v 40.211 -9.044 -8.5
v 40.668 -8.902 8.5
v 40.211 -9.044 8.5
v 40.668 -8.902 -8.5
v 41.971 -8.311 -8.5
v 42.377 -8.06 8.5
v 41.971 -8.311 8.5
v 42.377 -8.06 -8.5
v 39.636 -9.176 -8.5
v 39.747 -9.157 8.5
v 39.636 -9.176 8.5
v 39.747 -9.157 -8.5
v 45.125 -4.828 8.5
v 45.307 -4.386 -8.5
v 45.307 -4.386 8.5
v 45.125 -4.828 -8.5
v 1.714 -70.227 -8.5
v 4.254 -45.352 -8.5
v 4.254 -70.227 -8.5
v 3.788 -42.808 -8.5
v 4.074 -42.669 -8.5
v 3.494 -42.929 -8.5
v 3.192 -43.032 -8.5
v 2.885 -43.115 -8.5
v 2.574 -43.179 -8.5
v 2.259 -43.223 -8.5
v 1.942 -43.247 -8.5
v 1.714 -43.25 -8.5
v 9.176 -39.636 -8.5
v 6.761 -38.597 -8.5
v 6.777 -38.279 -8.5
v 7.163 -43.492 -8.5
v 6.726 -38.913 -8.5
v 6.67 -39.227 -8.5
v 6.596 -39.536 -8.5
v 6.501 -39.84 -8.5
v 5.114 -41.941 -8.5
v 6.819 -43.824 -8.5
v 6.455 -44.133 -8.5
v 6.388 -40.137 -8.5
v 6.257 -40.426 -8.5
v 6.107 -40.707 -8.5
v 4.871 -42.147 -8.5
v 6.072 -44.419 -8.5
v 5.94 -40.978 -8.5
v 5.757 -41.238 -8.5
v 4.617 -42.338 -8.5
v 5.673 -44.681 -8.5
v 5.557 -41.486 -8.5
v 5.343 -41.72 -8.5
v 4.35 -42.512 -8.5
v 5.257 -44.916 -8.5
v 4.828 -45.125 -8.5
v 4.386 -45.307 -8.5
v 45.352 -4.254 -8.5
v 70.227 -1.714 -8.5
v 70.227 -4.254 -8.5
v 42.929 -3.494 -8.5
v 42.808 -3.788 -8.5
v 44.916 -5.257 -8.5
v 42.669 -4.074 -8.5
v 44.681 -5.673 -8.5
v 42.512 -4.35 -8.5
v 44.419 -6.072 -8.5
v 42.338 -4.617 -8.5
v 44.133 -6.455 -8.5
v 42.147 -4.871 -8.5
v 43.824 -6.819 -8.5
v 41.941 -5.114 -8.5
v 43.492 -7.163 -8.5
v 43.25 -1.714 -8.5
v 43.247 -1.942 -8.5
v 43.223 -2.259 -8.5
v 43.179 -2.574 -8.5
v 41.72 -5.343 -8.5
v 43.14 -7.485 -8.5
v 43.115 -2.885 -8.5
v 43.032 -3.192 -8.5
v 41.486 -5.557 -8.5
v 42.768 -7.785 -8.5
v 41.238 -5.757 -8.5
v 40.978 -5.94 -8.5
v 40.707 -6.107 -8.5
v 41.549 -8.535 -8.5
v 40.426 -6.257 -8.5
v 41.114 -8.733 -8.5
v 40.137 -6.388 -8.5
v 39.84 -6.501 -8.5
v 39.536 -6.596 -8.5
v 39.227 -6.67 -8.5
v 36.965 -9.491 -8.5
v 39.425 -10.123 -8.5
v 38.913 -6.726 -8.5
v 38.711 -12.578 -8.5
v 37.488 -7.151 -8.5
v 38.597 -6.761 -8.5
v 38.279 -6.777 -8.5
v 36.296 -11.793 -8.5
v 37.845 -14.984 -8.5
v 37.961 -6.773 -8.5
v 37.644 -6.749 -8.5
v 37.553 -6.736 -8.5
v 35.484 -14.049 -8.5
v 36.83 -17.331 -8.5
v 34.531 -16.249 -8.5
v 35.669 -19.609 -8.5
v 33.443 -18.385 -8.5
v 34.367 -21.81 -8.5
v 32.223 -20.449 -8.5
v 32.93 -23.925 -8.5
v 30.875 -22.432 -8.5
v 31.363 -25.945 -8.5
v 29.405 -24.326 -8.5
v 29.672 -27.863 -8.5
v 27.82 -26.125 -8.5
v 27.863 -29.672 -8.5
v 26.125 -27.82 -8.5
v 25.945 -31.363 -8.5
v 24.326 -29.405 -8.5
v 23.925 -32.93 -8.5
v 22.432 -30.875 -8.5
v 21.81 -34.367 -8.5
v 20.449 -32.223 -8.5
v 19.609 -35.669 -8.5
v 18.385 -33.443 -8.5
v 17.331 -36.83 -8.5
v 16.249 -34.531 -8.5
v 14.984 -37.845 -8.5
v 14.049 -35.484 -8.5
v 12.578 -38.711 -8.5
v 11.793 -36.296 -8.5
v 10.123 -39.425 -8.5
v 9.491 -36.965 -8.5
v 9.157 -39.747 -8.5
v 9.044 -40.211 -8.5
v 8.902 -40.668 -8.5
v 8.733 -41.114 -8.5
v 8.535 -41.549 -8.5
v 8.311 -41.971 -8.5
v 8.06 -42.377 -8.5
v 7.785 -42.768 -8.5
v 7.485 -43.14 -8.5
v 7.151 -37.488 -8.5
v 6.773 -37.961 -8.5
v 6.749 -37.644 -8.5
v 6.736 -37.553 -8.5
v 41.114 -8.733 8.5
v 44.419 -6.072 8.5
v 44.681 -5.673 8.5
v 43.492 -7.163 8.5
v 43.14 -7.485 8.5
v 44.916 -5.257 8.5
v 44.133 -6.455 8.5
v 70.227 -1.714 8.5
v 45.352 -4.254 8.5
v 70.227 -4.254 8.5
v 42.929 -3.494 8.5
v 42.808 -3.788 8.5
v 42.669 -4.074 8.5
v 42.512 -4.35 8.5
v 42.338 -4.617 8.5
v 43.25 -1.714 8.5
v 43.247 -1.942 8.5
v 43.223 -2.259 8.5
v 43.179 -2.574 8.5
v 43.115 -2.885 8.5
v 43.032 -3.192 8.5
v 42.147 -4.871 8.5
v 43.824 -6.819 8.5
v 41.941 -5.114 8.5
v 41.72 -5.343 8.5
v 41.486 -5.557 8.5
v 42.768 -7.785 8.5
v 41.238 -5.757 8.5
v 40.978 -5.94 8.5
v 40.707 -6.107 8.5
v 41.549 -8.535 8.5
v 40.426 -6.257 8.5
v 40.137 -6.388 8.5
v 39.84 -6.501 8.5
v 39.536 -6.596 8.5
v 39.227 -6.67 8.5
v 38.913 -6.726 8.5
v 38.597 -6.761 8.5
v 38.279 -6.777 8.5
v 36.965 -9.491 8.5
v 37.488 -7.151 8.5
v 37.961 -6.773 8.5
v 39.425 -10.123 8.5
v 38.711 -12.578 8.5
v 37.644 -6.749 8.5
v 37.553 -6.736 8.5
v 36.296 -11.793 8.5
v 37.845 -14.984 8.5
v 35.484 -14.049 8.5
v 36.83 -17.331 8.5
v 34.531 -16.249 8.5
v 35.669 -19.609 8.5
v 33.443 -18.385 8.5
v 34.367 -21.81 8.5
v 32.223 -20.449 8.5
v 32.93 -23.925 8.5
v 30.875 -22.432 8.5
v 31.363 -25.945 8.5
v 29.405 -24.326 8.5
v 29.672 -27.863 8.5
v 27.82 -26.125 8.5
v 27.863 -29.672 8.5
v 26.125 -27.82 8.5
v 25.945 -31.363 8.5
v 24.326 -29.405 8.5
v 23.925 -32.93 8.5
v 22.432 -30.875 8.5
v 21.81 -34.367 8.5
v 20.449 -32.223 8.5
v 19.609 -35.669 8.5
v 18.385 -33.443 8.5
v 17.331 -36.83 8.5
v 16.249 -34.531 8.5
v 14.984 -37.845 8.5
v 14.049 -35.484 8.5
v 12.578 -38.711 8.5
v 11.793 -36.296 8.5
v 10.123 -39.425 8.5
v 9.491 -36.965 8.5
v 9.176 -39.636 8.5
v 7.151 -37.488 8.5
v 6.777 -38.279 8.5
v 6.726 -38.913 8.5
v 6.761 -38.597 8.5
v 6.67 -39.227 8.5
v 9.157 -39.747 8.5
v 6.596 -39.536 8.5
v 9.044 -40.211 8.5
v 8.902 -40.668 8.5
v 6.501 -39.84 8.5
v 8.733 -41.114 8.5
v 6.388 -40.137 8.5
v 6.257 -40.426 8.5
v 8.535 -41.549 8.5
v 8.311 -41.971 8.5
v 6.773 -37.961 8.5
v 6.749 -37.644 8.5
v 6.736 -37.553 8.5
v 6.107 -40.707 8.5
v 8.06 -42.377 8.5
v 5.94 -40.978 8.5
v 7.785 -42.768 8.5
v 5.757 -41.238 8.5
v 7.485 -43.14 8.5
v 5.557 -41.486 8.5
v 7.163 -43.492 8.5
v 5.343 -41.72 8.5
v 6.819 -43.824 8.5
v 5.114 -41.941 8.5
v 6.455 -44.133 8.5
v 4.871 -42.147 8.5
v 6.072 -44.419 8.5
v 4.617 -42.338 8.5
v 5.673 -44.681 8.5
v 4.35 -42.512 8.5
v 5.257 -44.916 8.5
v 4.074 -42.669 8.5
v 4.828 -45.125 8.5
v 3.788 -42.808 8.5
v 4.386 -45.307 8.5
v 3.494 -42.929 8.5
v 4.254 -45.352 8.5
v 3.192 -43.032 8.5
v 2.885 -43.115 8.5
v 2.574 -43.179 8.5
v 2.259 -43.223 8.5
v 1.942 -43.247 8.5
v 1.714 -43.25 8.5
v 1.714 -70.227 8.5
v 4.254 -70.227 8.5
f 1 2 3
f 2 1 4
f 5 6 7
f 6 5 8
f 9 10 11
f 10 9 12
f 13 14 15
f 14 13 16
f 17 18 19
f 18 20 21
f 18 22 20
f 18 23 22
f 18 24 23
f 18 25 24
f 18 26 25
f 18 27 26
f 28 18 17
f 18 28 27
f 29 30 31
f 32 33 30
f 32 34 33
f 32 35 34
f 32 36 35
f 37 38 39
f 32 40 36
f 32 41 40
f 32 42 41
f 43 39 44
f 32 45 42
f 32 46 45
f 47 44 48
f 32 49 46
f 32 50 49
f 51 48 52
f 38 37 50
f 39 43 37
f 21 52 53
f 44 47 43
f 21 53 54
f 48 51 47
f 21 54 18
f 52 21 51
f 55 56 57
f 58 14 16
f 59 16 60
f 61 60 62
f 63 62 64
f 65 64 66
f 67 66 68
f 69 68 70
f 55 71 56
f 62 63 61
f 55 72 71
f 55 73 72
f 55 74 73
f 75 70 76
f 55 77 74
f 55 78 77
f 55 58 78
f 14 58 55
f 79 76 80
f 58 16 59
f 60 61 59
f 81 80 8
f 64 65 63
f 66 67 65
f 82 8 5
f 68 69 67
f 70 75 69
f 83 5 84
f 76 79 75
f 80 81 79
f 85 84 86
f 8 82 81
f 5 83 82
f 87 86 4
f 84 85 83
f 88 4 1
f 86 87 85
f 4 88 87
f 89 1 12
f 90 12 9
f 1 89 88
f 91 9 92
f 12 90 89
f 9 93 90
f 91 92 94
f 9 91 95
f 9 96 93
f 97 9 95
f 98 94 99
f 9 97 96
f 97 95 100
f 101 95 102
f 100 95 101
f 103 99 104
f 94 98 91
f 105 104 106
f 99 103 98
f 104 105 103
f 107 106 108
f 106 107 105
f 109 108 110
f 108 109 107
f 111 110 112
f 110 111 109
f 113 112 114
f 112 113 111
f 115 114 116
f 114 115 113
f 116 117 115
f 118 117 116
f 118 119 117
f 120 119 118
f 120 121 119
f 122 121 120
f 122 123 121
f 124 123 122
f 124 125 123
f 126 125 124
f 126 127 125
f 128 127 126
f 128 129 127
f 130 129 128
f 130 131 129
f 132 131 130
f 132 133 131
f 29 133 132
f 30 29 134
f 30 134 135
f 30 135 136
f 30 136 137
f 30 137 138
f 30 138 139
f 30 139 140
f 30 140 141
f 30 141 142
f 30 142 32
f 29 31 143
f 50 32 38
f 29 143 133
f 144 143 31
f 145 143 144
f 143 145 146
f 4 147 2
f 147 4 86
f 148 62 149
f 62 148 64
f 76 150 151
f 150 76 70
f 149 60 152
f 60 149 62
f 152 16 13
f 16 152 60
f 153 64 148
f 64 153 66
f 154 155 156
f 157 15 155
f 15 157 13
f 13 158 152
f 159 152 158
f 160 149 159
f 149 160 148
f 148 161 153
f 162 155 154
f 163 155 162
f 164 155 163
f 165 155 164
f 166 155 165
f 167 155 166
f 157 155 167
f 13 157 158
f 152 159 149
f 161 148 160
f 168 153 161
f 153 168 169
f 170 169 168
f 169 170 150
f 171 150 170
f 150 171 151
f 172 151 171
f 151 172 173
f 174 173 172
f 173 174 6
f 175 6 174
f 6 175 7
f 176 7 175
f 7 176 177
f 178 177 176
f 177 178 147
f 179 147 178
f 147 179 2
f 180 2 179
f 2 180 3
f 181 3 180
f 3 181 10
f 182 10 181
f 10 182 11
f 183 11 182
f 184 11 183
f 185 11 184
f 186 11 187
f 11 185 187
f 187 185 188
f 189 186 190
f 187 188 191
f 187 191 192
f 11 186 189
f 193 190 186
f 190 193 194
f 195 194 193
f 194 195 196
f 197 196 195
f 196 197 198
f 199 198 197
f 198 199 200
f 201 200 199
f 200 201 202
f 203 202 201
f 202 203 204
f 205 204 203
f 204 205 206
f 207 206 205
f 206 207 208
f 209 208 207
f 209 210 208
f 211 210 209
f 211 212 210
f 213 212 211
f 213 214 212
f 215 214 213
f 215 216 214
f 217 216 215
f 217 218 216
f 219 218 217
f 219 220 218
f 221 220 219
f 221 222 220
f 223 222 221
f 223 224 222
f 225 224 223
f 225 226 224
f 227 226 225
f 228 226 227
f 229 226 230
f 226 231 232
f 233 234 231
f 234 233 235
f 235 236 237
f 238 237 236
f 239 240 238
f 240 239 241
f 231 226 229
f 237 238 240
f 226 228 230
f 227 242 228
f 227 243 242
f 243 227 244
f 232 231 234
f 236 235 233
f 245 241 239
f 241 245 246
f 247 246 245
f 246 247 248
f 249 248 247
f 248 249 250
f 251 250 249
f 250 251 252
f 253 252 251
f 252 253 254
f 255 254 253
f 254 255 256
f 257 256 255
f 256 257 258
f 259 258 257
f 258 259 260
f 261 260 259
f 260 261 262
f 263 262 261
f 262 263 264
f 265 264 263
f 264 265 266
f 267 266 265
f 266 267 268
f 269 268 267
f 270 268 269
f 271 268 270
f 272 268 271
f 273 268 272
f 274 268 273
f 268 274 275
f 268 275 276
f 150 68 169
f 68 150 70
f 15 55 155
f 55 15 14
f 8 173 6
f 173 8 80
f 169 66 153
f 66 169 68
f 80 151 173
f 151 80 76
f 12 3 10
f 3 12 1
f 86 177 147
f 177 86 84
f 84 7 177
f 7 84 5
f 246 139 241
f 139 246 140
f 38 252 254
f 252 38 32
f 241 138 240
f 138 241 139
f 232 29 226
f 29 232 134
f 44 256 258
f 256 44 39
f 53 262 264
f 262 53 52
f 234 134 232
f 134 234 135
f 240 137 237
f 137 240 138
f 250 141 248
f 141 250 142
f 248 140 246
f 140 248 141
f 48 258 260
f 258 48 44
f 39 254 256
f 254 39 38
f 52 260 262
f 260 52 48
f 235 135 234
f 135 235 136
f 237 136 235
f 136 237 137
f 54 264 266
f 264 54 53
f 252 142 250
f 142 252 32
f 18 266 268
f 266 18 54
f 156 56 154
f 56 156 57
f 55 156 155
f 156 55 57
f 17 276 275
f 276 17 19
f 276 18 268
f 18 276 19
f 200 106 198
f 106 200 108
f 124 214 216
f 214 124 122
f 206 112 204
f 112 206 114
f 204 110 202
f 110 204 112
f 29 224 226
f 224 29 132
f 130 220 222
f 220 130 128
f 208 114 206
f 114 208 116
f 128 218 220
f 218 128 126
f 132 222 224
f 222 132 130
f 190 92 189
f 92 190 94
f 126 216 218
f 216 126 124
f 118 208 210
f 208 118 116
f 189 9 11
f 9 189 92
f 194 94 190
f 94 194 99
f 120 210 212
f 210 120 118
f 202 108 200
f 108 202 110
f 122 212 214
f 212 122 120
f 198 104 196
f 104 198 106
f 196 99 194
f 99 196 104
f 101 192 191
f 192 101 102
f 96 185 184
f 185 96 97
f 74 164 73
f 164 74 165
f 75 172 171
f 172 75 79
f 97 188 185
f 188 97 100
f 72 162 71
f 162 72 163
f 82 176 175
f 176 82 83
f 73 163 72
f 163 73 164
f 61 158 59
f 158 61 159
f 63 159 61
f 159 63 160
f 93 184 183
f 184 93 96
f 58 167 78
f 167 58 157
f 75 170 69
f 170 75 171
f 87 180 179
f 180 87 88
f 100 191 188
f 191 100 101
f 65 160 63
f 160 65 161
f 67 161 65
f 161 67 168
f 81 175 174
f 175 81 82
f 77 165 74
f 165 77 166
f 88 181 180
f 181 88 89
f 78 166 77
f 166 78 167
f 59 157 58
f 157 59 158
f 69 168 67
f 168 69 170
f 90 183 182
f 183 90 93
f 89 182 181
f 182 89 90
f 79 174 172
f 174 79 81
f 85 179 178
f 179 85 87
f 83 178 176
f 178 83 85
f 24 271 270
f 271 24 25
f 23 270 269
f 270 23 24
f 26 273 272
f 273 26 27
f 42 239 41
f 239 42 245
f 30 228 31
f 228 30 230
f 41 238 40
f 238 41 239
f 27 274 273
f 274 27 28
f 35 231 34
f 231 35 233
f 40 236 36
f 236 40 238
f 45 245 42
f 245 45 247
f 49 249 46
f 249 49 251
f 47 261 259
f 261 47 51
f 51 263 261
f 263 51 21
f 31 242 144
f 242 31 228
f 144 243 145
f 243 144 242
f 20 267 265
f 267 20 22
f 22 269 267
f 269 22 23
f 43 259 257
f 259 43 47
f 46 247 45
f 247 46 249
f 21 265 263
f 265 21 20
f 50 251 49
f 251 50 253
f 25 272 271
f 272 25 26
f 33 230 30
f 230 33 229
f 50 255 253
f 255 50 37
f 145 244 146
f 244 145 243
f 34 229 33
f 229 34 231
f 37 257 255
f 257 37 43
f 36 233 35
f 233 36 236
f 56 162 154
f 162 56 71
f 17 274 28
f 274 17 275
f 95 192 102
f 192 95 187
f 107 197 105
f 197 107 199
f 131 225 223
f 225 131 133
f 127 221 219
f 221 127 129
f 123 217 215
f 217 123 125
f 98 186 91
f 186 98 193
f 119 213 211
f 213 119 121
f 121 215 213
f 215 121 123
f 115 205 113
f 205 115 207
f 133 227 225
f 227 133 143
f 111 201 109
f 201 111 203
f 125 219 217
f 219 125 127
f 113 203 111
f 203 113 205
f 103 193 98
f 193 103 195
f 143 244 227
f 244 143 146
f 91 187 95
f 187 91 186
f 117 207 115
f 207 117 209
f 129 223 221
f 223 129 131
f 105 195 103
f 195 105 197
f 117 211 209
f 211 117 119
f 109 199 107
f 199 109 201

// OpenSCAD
//--------------------------------------------------
// Model rocket fin alignment tool generator
//
// For openSCAD 15.03-2, and Thingiverse Customizer
//
// Written by Erik Ness 2016/12/30
//
// erik@nessnation.com
//--------------------------------------------------


//--------------------------------------------------
//        User-entered parameters
//
//  Formatted for thingiverse customizer.
//
// NOTE:  I converted the inch parameters to mm
// and then turned off inches mode because the
// thingiverse customizer freaked out when I used
// inches, even though openscad works fine.
//
// NOTE2:  Thingiverse customizer also freaks out
// if you type trailing zeros, like 1.0 or 1.10,
// so don't do that!
//--------------------------------------------------

// Dimensions are inches?  (If yes, output is scaled by 25.4 in xyz)
use_inches            = 0;      // [0:No,1:Yes]

// Rocket body outside diameter:
rocket_od             = 76.2;

// Number of fins:
rocket_num_fins       = 4;  // [3:6]

// Rocket fin thickness:
rocket_fin_thick      = 3.175;

// Tool thickness:
tool_thick            = 2.54;

// Tool height:
tool_height           = 17;

// Tool fin length (extension from rocket body):
tool_fin_len          = 32;

// Glue keepout diameter:
tool_glue_keepout_dia = 10;

// Slop for rocket body dia and fin thickness:
tool_slop             = 0.127;




/* [Hidden] */
$fn = 100;

draw_fin_len          = rocket_od / 2 + tool_fin_len * 2;
fin_angle             = 360/rocket_num_fins;
delta_angle_glue      = asin(  (rocket_fin_thick/2 + tool_slop)
                             / (rocket_od/2 + tool_slop)
                            );
final_scale           = use_inches ? 25.400 : 1.000;


scale([final_scale,final_scale,final_scale])
    difference()
    {
        union()
        {
            // Tool main arc (around rocket body):
            cylinder(  tool_height
                     , d=rocket_od+tool_slop+2*tool_thick
                     , center=true
                    );

            for (a=[0 : fin_angle : 359])
            {
                rotate([0,0,a])
                    translate([rocket_od/2+tool_slop+tool_fin_len/2,0,0])
                        cube(  [  tool_fin_len
                                , rocket_fin_thick+2*tool_slop+2*tool_thick
                                , tool_height
                               ]
                             , center=true
                            );

                for (a2=[-delta_angle_glue, delta_angle_glue])
                    rotate([0,0,a+a2])
                        translate([rocket_od/2 + tool_slop, 0, 0])
                            cylinder( h=tool_height
                                     ,d=tool_glue_keepout_dia+tool_slop+2*tool_thick
                                     ,center=true
                                    );
            }
        }

        // Erase rocket body and fins:
        rocket_with_slop();
        
        // Erase extra copies of tool:
        pie_wedge(  tool_height * 1.1
                  , rocket_od+draw_fin_len
                  , 360-fin_angle
                 );
    }






// Rocket body and fins: (plus slop)
// These are subtracted from the tool:
module rocket_with_slop()
{
    // Rocket body:
    cylinder(  tool_height*1.1
             , d=rocket_od+tool_slop
             , center=true
            );

    for (a=[0 : fin_angle : 359])
    {
        // Fin:
        rotate([0,0,a])
            translate([draw_fin_len/2,0,0])
                cube(  [  draw_fin_len*1.1
                        , rocket_fin_thick+2*tool_slop
                        , tool_height*1.1
                       ]
                     , center=true
                    );
        
        // Glue keepout cylinder:
        for (a2=[-delta_angle_glue, delta_angle_glue])
            rotate([0,0,a+a2])
                translate([rocket_od/2 + tool_slop, 0, 0])
                    cylinder( h=tool_height*1.1
                             ,d=tool_glue_keepout_dia+tool_slop
                             ,center=true
                            );
    }
}





// Draws a pie wedge h units tall, r units in radius,
// starting at angle=0, going to angle=a
module pie_wedge(h,r,a)
{
    // This would work if the angle parameter was obeyed by openscad,
    // but for that you need an openscad version from 2016 or later
    // and these are currently pre-release (as of December 2016).
    //
    //    rotate_extrude(angle=a,convexity = 10)
    //        translate([r, 0, 0])
    //            square([r,h],true);
    
    
    
    // So instead, here's a really stupid "pie wedge":
    sub_angle = a/10;
    for (a2=[0 : sub_angle/2 : a*0.91])
    {
        x1 = cos(a2) * r;
        y1 = sin(a2) * r;

        x2 = cos(a2+sub_angle) * r;
        y2 = sin(a2+sub_angle) * r;
        
        linear_extrude(height=h, center=true)
            polygon(points=[[0,0],[x1,y1],[x2,y2],[0,0]]);
    }
}
